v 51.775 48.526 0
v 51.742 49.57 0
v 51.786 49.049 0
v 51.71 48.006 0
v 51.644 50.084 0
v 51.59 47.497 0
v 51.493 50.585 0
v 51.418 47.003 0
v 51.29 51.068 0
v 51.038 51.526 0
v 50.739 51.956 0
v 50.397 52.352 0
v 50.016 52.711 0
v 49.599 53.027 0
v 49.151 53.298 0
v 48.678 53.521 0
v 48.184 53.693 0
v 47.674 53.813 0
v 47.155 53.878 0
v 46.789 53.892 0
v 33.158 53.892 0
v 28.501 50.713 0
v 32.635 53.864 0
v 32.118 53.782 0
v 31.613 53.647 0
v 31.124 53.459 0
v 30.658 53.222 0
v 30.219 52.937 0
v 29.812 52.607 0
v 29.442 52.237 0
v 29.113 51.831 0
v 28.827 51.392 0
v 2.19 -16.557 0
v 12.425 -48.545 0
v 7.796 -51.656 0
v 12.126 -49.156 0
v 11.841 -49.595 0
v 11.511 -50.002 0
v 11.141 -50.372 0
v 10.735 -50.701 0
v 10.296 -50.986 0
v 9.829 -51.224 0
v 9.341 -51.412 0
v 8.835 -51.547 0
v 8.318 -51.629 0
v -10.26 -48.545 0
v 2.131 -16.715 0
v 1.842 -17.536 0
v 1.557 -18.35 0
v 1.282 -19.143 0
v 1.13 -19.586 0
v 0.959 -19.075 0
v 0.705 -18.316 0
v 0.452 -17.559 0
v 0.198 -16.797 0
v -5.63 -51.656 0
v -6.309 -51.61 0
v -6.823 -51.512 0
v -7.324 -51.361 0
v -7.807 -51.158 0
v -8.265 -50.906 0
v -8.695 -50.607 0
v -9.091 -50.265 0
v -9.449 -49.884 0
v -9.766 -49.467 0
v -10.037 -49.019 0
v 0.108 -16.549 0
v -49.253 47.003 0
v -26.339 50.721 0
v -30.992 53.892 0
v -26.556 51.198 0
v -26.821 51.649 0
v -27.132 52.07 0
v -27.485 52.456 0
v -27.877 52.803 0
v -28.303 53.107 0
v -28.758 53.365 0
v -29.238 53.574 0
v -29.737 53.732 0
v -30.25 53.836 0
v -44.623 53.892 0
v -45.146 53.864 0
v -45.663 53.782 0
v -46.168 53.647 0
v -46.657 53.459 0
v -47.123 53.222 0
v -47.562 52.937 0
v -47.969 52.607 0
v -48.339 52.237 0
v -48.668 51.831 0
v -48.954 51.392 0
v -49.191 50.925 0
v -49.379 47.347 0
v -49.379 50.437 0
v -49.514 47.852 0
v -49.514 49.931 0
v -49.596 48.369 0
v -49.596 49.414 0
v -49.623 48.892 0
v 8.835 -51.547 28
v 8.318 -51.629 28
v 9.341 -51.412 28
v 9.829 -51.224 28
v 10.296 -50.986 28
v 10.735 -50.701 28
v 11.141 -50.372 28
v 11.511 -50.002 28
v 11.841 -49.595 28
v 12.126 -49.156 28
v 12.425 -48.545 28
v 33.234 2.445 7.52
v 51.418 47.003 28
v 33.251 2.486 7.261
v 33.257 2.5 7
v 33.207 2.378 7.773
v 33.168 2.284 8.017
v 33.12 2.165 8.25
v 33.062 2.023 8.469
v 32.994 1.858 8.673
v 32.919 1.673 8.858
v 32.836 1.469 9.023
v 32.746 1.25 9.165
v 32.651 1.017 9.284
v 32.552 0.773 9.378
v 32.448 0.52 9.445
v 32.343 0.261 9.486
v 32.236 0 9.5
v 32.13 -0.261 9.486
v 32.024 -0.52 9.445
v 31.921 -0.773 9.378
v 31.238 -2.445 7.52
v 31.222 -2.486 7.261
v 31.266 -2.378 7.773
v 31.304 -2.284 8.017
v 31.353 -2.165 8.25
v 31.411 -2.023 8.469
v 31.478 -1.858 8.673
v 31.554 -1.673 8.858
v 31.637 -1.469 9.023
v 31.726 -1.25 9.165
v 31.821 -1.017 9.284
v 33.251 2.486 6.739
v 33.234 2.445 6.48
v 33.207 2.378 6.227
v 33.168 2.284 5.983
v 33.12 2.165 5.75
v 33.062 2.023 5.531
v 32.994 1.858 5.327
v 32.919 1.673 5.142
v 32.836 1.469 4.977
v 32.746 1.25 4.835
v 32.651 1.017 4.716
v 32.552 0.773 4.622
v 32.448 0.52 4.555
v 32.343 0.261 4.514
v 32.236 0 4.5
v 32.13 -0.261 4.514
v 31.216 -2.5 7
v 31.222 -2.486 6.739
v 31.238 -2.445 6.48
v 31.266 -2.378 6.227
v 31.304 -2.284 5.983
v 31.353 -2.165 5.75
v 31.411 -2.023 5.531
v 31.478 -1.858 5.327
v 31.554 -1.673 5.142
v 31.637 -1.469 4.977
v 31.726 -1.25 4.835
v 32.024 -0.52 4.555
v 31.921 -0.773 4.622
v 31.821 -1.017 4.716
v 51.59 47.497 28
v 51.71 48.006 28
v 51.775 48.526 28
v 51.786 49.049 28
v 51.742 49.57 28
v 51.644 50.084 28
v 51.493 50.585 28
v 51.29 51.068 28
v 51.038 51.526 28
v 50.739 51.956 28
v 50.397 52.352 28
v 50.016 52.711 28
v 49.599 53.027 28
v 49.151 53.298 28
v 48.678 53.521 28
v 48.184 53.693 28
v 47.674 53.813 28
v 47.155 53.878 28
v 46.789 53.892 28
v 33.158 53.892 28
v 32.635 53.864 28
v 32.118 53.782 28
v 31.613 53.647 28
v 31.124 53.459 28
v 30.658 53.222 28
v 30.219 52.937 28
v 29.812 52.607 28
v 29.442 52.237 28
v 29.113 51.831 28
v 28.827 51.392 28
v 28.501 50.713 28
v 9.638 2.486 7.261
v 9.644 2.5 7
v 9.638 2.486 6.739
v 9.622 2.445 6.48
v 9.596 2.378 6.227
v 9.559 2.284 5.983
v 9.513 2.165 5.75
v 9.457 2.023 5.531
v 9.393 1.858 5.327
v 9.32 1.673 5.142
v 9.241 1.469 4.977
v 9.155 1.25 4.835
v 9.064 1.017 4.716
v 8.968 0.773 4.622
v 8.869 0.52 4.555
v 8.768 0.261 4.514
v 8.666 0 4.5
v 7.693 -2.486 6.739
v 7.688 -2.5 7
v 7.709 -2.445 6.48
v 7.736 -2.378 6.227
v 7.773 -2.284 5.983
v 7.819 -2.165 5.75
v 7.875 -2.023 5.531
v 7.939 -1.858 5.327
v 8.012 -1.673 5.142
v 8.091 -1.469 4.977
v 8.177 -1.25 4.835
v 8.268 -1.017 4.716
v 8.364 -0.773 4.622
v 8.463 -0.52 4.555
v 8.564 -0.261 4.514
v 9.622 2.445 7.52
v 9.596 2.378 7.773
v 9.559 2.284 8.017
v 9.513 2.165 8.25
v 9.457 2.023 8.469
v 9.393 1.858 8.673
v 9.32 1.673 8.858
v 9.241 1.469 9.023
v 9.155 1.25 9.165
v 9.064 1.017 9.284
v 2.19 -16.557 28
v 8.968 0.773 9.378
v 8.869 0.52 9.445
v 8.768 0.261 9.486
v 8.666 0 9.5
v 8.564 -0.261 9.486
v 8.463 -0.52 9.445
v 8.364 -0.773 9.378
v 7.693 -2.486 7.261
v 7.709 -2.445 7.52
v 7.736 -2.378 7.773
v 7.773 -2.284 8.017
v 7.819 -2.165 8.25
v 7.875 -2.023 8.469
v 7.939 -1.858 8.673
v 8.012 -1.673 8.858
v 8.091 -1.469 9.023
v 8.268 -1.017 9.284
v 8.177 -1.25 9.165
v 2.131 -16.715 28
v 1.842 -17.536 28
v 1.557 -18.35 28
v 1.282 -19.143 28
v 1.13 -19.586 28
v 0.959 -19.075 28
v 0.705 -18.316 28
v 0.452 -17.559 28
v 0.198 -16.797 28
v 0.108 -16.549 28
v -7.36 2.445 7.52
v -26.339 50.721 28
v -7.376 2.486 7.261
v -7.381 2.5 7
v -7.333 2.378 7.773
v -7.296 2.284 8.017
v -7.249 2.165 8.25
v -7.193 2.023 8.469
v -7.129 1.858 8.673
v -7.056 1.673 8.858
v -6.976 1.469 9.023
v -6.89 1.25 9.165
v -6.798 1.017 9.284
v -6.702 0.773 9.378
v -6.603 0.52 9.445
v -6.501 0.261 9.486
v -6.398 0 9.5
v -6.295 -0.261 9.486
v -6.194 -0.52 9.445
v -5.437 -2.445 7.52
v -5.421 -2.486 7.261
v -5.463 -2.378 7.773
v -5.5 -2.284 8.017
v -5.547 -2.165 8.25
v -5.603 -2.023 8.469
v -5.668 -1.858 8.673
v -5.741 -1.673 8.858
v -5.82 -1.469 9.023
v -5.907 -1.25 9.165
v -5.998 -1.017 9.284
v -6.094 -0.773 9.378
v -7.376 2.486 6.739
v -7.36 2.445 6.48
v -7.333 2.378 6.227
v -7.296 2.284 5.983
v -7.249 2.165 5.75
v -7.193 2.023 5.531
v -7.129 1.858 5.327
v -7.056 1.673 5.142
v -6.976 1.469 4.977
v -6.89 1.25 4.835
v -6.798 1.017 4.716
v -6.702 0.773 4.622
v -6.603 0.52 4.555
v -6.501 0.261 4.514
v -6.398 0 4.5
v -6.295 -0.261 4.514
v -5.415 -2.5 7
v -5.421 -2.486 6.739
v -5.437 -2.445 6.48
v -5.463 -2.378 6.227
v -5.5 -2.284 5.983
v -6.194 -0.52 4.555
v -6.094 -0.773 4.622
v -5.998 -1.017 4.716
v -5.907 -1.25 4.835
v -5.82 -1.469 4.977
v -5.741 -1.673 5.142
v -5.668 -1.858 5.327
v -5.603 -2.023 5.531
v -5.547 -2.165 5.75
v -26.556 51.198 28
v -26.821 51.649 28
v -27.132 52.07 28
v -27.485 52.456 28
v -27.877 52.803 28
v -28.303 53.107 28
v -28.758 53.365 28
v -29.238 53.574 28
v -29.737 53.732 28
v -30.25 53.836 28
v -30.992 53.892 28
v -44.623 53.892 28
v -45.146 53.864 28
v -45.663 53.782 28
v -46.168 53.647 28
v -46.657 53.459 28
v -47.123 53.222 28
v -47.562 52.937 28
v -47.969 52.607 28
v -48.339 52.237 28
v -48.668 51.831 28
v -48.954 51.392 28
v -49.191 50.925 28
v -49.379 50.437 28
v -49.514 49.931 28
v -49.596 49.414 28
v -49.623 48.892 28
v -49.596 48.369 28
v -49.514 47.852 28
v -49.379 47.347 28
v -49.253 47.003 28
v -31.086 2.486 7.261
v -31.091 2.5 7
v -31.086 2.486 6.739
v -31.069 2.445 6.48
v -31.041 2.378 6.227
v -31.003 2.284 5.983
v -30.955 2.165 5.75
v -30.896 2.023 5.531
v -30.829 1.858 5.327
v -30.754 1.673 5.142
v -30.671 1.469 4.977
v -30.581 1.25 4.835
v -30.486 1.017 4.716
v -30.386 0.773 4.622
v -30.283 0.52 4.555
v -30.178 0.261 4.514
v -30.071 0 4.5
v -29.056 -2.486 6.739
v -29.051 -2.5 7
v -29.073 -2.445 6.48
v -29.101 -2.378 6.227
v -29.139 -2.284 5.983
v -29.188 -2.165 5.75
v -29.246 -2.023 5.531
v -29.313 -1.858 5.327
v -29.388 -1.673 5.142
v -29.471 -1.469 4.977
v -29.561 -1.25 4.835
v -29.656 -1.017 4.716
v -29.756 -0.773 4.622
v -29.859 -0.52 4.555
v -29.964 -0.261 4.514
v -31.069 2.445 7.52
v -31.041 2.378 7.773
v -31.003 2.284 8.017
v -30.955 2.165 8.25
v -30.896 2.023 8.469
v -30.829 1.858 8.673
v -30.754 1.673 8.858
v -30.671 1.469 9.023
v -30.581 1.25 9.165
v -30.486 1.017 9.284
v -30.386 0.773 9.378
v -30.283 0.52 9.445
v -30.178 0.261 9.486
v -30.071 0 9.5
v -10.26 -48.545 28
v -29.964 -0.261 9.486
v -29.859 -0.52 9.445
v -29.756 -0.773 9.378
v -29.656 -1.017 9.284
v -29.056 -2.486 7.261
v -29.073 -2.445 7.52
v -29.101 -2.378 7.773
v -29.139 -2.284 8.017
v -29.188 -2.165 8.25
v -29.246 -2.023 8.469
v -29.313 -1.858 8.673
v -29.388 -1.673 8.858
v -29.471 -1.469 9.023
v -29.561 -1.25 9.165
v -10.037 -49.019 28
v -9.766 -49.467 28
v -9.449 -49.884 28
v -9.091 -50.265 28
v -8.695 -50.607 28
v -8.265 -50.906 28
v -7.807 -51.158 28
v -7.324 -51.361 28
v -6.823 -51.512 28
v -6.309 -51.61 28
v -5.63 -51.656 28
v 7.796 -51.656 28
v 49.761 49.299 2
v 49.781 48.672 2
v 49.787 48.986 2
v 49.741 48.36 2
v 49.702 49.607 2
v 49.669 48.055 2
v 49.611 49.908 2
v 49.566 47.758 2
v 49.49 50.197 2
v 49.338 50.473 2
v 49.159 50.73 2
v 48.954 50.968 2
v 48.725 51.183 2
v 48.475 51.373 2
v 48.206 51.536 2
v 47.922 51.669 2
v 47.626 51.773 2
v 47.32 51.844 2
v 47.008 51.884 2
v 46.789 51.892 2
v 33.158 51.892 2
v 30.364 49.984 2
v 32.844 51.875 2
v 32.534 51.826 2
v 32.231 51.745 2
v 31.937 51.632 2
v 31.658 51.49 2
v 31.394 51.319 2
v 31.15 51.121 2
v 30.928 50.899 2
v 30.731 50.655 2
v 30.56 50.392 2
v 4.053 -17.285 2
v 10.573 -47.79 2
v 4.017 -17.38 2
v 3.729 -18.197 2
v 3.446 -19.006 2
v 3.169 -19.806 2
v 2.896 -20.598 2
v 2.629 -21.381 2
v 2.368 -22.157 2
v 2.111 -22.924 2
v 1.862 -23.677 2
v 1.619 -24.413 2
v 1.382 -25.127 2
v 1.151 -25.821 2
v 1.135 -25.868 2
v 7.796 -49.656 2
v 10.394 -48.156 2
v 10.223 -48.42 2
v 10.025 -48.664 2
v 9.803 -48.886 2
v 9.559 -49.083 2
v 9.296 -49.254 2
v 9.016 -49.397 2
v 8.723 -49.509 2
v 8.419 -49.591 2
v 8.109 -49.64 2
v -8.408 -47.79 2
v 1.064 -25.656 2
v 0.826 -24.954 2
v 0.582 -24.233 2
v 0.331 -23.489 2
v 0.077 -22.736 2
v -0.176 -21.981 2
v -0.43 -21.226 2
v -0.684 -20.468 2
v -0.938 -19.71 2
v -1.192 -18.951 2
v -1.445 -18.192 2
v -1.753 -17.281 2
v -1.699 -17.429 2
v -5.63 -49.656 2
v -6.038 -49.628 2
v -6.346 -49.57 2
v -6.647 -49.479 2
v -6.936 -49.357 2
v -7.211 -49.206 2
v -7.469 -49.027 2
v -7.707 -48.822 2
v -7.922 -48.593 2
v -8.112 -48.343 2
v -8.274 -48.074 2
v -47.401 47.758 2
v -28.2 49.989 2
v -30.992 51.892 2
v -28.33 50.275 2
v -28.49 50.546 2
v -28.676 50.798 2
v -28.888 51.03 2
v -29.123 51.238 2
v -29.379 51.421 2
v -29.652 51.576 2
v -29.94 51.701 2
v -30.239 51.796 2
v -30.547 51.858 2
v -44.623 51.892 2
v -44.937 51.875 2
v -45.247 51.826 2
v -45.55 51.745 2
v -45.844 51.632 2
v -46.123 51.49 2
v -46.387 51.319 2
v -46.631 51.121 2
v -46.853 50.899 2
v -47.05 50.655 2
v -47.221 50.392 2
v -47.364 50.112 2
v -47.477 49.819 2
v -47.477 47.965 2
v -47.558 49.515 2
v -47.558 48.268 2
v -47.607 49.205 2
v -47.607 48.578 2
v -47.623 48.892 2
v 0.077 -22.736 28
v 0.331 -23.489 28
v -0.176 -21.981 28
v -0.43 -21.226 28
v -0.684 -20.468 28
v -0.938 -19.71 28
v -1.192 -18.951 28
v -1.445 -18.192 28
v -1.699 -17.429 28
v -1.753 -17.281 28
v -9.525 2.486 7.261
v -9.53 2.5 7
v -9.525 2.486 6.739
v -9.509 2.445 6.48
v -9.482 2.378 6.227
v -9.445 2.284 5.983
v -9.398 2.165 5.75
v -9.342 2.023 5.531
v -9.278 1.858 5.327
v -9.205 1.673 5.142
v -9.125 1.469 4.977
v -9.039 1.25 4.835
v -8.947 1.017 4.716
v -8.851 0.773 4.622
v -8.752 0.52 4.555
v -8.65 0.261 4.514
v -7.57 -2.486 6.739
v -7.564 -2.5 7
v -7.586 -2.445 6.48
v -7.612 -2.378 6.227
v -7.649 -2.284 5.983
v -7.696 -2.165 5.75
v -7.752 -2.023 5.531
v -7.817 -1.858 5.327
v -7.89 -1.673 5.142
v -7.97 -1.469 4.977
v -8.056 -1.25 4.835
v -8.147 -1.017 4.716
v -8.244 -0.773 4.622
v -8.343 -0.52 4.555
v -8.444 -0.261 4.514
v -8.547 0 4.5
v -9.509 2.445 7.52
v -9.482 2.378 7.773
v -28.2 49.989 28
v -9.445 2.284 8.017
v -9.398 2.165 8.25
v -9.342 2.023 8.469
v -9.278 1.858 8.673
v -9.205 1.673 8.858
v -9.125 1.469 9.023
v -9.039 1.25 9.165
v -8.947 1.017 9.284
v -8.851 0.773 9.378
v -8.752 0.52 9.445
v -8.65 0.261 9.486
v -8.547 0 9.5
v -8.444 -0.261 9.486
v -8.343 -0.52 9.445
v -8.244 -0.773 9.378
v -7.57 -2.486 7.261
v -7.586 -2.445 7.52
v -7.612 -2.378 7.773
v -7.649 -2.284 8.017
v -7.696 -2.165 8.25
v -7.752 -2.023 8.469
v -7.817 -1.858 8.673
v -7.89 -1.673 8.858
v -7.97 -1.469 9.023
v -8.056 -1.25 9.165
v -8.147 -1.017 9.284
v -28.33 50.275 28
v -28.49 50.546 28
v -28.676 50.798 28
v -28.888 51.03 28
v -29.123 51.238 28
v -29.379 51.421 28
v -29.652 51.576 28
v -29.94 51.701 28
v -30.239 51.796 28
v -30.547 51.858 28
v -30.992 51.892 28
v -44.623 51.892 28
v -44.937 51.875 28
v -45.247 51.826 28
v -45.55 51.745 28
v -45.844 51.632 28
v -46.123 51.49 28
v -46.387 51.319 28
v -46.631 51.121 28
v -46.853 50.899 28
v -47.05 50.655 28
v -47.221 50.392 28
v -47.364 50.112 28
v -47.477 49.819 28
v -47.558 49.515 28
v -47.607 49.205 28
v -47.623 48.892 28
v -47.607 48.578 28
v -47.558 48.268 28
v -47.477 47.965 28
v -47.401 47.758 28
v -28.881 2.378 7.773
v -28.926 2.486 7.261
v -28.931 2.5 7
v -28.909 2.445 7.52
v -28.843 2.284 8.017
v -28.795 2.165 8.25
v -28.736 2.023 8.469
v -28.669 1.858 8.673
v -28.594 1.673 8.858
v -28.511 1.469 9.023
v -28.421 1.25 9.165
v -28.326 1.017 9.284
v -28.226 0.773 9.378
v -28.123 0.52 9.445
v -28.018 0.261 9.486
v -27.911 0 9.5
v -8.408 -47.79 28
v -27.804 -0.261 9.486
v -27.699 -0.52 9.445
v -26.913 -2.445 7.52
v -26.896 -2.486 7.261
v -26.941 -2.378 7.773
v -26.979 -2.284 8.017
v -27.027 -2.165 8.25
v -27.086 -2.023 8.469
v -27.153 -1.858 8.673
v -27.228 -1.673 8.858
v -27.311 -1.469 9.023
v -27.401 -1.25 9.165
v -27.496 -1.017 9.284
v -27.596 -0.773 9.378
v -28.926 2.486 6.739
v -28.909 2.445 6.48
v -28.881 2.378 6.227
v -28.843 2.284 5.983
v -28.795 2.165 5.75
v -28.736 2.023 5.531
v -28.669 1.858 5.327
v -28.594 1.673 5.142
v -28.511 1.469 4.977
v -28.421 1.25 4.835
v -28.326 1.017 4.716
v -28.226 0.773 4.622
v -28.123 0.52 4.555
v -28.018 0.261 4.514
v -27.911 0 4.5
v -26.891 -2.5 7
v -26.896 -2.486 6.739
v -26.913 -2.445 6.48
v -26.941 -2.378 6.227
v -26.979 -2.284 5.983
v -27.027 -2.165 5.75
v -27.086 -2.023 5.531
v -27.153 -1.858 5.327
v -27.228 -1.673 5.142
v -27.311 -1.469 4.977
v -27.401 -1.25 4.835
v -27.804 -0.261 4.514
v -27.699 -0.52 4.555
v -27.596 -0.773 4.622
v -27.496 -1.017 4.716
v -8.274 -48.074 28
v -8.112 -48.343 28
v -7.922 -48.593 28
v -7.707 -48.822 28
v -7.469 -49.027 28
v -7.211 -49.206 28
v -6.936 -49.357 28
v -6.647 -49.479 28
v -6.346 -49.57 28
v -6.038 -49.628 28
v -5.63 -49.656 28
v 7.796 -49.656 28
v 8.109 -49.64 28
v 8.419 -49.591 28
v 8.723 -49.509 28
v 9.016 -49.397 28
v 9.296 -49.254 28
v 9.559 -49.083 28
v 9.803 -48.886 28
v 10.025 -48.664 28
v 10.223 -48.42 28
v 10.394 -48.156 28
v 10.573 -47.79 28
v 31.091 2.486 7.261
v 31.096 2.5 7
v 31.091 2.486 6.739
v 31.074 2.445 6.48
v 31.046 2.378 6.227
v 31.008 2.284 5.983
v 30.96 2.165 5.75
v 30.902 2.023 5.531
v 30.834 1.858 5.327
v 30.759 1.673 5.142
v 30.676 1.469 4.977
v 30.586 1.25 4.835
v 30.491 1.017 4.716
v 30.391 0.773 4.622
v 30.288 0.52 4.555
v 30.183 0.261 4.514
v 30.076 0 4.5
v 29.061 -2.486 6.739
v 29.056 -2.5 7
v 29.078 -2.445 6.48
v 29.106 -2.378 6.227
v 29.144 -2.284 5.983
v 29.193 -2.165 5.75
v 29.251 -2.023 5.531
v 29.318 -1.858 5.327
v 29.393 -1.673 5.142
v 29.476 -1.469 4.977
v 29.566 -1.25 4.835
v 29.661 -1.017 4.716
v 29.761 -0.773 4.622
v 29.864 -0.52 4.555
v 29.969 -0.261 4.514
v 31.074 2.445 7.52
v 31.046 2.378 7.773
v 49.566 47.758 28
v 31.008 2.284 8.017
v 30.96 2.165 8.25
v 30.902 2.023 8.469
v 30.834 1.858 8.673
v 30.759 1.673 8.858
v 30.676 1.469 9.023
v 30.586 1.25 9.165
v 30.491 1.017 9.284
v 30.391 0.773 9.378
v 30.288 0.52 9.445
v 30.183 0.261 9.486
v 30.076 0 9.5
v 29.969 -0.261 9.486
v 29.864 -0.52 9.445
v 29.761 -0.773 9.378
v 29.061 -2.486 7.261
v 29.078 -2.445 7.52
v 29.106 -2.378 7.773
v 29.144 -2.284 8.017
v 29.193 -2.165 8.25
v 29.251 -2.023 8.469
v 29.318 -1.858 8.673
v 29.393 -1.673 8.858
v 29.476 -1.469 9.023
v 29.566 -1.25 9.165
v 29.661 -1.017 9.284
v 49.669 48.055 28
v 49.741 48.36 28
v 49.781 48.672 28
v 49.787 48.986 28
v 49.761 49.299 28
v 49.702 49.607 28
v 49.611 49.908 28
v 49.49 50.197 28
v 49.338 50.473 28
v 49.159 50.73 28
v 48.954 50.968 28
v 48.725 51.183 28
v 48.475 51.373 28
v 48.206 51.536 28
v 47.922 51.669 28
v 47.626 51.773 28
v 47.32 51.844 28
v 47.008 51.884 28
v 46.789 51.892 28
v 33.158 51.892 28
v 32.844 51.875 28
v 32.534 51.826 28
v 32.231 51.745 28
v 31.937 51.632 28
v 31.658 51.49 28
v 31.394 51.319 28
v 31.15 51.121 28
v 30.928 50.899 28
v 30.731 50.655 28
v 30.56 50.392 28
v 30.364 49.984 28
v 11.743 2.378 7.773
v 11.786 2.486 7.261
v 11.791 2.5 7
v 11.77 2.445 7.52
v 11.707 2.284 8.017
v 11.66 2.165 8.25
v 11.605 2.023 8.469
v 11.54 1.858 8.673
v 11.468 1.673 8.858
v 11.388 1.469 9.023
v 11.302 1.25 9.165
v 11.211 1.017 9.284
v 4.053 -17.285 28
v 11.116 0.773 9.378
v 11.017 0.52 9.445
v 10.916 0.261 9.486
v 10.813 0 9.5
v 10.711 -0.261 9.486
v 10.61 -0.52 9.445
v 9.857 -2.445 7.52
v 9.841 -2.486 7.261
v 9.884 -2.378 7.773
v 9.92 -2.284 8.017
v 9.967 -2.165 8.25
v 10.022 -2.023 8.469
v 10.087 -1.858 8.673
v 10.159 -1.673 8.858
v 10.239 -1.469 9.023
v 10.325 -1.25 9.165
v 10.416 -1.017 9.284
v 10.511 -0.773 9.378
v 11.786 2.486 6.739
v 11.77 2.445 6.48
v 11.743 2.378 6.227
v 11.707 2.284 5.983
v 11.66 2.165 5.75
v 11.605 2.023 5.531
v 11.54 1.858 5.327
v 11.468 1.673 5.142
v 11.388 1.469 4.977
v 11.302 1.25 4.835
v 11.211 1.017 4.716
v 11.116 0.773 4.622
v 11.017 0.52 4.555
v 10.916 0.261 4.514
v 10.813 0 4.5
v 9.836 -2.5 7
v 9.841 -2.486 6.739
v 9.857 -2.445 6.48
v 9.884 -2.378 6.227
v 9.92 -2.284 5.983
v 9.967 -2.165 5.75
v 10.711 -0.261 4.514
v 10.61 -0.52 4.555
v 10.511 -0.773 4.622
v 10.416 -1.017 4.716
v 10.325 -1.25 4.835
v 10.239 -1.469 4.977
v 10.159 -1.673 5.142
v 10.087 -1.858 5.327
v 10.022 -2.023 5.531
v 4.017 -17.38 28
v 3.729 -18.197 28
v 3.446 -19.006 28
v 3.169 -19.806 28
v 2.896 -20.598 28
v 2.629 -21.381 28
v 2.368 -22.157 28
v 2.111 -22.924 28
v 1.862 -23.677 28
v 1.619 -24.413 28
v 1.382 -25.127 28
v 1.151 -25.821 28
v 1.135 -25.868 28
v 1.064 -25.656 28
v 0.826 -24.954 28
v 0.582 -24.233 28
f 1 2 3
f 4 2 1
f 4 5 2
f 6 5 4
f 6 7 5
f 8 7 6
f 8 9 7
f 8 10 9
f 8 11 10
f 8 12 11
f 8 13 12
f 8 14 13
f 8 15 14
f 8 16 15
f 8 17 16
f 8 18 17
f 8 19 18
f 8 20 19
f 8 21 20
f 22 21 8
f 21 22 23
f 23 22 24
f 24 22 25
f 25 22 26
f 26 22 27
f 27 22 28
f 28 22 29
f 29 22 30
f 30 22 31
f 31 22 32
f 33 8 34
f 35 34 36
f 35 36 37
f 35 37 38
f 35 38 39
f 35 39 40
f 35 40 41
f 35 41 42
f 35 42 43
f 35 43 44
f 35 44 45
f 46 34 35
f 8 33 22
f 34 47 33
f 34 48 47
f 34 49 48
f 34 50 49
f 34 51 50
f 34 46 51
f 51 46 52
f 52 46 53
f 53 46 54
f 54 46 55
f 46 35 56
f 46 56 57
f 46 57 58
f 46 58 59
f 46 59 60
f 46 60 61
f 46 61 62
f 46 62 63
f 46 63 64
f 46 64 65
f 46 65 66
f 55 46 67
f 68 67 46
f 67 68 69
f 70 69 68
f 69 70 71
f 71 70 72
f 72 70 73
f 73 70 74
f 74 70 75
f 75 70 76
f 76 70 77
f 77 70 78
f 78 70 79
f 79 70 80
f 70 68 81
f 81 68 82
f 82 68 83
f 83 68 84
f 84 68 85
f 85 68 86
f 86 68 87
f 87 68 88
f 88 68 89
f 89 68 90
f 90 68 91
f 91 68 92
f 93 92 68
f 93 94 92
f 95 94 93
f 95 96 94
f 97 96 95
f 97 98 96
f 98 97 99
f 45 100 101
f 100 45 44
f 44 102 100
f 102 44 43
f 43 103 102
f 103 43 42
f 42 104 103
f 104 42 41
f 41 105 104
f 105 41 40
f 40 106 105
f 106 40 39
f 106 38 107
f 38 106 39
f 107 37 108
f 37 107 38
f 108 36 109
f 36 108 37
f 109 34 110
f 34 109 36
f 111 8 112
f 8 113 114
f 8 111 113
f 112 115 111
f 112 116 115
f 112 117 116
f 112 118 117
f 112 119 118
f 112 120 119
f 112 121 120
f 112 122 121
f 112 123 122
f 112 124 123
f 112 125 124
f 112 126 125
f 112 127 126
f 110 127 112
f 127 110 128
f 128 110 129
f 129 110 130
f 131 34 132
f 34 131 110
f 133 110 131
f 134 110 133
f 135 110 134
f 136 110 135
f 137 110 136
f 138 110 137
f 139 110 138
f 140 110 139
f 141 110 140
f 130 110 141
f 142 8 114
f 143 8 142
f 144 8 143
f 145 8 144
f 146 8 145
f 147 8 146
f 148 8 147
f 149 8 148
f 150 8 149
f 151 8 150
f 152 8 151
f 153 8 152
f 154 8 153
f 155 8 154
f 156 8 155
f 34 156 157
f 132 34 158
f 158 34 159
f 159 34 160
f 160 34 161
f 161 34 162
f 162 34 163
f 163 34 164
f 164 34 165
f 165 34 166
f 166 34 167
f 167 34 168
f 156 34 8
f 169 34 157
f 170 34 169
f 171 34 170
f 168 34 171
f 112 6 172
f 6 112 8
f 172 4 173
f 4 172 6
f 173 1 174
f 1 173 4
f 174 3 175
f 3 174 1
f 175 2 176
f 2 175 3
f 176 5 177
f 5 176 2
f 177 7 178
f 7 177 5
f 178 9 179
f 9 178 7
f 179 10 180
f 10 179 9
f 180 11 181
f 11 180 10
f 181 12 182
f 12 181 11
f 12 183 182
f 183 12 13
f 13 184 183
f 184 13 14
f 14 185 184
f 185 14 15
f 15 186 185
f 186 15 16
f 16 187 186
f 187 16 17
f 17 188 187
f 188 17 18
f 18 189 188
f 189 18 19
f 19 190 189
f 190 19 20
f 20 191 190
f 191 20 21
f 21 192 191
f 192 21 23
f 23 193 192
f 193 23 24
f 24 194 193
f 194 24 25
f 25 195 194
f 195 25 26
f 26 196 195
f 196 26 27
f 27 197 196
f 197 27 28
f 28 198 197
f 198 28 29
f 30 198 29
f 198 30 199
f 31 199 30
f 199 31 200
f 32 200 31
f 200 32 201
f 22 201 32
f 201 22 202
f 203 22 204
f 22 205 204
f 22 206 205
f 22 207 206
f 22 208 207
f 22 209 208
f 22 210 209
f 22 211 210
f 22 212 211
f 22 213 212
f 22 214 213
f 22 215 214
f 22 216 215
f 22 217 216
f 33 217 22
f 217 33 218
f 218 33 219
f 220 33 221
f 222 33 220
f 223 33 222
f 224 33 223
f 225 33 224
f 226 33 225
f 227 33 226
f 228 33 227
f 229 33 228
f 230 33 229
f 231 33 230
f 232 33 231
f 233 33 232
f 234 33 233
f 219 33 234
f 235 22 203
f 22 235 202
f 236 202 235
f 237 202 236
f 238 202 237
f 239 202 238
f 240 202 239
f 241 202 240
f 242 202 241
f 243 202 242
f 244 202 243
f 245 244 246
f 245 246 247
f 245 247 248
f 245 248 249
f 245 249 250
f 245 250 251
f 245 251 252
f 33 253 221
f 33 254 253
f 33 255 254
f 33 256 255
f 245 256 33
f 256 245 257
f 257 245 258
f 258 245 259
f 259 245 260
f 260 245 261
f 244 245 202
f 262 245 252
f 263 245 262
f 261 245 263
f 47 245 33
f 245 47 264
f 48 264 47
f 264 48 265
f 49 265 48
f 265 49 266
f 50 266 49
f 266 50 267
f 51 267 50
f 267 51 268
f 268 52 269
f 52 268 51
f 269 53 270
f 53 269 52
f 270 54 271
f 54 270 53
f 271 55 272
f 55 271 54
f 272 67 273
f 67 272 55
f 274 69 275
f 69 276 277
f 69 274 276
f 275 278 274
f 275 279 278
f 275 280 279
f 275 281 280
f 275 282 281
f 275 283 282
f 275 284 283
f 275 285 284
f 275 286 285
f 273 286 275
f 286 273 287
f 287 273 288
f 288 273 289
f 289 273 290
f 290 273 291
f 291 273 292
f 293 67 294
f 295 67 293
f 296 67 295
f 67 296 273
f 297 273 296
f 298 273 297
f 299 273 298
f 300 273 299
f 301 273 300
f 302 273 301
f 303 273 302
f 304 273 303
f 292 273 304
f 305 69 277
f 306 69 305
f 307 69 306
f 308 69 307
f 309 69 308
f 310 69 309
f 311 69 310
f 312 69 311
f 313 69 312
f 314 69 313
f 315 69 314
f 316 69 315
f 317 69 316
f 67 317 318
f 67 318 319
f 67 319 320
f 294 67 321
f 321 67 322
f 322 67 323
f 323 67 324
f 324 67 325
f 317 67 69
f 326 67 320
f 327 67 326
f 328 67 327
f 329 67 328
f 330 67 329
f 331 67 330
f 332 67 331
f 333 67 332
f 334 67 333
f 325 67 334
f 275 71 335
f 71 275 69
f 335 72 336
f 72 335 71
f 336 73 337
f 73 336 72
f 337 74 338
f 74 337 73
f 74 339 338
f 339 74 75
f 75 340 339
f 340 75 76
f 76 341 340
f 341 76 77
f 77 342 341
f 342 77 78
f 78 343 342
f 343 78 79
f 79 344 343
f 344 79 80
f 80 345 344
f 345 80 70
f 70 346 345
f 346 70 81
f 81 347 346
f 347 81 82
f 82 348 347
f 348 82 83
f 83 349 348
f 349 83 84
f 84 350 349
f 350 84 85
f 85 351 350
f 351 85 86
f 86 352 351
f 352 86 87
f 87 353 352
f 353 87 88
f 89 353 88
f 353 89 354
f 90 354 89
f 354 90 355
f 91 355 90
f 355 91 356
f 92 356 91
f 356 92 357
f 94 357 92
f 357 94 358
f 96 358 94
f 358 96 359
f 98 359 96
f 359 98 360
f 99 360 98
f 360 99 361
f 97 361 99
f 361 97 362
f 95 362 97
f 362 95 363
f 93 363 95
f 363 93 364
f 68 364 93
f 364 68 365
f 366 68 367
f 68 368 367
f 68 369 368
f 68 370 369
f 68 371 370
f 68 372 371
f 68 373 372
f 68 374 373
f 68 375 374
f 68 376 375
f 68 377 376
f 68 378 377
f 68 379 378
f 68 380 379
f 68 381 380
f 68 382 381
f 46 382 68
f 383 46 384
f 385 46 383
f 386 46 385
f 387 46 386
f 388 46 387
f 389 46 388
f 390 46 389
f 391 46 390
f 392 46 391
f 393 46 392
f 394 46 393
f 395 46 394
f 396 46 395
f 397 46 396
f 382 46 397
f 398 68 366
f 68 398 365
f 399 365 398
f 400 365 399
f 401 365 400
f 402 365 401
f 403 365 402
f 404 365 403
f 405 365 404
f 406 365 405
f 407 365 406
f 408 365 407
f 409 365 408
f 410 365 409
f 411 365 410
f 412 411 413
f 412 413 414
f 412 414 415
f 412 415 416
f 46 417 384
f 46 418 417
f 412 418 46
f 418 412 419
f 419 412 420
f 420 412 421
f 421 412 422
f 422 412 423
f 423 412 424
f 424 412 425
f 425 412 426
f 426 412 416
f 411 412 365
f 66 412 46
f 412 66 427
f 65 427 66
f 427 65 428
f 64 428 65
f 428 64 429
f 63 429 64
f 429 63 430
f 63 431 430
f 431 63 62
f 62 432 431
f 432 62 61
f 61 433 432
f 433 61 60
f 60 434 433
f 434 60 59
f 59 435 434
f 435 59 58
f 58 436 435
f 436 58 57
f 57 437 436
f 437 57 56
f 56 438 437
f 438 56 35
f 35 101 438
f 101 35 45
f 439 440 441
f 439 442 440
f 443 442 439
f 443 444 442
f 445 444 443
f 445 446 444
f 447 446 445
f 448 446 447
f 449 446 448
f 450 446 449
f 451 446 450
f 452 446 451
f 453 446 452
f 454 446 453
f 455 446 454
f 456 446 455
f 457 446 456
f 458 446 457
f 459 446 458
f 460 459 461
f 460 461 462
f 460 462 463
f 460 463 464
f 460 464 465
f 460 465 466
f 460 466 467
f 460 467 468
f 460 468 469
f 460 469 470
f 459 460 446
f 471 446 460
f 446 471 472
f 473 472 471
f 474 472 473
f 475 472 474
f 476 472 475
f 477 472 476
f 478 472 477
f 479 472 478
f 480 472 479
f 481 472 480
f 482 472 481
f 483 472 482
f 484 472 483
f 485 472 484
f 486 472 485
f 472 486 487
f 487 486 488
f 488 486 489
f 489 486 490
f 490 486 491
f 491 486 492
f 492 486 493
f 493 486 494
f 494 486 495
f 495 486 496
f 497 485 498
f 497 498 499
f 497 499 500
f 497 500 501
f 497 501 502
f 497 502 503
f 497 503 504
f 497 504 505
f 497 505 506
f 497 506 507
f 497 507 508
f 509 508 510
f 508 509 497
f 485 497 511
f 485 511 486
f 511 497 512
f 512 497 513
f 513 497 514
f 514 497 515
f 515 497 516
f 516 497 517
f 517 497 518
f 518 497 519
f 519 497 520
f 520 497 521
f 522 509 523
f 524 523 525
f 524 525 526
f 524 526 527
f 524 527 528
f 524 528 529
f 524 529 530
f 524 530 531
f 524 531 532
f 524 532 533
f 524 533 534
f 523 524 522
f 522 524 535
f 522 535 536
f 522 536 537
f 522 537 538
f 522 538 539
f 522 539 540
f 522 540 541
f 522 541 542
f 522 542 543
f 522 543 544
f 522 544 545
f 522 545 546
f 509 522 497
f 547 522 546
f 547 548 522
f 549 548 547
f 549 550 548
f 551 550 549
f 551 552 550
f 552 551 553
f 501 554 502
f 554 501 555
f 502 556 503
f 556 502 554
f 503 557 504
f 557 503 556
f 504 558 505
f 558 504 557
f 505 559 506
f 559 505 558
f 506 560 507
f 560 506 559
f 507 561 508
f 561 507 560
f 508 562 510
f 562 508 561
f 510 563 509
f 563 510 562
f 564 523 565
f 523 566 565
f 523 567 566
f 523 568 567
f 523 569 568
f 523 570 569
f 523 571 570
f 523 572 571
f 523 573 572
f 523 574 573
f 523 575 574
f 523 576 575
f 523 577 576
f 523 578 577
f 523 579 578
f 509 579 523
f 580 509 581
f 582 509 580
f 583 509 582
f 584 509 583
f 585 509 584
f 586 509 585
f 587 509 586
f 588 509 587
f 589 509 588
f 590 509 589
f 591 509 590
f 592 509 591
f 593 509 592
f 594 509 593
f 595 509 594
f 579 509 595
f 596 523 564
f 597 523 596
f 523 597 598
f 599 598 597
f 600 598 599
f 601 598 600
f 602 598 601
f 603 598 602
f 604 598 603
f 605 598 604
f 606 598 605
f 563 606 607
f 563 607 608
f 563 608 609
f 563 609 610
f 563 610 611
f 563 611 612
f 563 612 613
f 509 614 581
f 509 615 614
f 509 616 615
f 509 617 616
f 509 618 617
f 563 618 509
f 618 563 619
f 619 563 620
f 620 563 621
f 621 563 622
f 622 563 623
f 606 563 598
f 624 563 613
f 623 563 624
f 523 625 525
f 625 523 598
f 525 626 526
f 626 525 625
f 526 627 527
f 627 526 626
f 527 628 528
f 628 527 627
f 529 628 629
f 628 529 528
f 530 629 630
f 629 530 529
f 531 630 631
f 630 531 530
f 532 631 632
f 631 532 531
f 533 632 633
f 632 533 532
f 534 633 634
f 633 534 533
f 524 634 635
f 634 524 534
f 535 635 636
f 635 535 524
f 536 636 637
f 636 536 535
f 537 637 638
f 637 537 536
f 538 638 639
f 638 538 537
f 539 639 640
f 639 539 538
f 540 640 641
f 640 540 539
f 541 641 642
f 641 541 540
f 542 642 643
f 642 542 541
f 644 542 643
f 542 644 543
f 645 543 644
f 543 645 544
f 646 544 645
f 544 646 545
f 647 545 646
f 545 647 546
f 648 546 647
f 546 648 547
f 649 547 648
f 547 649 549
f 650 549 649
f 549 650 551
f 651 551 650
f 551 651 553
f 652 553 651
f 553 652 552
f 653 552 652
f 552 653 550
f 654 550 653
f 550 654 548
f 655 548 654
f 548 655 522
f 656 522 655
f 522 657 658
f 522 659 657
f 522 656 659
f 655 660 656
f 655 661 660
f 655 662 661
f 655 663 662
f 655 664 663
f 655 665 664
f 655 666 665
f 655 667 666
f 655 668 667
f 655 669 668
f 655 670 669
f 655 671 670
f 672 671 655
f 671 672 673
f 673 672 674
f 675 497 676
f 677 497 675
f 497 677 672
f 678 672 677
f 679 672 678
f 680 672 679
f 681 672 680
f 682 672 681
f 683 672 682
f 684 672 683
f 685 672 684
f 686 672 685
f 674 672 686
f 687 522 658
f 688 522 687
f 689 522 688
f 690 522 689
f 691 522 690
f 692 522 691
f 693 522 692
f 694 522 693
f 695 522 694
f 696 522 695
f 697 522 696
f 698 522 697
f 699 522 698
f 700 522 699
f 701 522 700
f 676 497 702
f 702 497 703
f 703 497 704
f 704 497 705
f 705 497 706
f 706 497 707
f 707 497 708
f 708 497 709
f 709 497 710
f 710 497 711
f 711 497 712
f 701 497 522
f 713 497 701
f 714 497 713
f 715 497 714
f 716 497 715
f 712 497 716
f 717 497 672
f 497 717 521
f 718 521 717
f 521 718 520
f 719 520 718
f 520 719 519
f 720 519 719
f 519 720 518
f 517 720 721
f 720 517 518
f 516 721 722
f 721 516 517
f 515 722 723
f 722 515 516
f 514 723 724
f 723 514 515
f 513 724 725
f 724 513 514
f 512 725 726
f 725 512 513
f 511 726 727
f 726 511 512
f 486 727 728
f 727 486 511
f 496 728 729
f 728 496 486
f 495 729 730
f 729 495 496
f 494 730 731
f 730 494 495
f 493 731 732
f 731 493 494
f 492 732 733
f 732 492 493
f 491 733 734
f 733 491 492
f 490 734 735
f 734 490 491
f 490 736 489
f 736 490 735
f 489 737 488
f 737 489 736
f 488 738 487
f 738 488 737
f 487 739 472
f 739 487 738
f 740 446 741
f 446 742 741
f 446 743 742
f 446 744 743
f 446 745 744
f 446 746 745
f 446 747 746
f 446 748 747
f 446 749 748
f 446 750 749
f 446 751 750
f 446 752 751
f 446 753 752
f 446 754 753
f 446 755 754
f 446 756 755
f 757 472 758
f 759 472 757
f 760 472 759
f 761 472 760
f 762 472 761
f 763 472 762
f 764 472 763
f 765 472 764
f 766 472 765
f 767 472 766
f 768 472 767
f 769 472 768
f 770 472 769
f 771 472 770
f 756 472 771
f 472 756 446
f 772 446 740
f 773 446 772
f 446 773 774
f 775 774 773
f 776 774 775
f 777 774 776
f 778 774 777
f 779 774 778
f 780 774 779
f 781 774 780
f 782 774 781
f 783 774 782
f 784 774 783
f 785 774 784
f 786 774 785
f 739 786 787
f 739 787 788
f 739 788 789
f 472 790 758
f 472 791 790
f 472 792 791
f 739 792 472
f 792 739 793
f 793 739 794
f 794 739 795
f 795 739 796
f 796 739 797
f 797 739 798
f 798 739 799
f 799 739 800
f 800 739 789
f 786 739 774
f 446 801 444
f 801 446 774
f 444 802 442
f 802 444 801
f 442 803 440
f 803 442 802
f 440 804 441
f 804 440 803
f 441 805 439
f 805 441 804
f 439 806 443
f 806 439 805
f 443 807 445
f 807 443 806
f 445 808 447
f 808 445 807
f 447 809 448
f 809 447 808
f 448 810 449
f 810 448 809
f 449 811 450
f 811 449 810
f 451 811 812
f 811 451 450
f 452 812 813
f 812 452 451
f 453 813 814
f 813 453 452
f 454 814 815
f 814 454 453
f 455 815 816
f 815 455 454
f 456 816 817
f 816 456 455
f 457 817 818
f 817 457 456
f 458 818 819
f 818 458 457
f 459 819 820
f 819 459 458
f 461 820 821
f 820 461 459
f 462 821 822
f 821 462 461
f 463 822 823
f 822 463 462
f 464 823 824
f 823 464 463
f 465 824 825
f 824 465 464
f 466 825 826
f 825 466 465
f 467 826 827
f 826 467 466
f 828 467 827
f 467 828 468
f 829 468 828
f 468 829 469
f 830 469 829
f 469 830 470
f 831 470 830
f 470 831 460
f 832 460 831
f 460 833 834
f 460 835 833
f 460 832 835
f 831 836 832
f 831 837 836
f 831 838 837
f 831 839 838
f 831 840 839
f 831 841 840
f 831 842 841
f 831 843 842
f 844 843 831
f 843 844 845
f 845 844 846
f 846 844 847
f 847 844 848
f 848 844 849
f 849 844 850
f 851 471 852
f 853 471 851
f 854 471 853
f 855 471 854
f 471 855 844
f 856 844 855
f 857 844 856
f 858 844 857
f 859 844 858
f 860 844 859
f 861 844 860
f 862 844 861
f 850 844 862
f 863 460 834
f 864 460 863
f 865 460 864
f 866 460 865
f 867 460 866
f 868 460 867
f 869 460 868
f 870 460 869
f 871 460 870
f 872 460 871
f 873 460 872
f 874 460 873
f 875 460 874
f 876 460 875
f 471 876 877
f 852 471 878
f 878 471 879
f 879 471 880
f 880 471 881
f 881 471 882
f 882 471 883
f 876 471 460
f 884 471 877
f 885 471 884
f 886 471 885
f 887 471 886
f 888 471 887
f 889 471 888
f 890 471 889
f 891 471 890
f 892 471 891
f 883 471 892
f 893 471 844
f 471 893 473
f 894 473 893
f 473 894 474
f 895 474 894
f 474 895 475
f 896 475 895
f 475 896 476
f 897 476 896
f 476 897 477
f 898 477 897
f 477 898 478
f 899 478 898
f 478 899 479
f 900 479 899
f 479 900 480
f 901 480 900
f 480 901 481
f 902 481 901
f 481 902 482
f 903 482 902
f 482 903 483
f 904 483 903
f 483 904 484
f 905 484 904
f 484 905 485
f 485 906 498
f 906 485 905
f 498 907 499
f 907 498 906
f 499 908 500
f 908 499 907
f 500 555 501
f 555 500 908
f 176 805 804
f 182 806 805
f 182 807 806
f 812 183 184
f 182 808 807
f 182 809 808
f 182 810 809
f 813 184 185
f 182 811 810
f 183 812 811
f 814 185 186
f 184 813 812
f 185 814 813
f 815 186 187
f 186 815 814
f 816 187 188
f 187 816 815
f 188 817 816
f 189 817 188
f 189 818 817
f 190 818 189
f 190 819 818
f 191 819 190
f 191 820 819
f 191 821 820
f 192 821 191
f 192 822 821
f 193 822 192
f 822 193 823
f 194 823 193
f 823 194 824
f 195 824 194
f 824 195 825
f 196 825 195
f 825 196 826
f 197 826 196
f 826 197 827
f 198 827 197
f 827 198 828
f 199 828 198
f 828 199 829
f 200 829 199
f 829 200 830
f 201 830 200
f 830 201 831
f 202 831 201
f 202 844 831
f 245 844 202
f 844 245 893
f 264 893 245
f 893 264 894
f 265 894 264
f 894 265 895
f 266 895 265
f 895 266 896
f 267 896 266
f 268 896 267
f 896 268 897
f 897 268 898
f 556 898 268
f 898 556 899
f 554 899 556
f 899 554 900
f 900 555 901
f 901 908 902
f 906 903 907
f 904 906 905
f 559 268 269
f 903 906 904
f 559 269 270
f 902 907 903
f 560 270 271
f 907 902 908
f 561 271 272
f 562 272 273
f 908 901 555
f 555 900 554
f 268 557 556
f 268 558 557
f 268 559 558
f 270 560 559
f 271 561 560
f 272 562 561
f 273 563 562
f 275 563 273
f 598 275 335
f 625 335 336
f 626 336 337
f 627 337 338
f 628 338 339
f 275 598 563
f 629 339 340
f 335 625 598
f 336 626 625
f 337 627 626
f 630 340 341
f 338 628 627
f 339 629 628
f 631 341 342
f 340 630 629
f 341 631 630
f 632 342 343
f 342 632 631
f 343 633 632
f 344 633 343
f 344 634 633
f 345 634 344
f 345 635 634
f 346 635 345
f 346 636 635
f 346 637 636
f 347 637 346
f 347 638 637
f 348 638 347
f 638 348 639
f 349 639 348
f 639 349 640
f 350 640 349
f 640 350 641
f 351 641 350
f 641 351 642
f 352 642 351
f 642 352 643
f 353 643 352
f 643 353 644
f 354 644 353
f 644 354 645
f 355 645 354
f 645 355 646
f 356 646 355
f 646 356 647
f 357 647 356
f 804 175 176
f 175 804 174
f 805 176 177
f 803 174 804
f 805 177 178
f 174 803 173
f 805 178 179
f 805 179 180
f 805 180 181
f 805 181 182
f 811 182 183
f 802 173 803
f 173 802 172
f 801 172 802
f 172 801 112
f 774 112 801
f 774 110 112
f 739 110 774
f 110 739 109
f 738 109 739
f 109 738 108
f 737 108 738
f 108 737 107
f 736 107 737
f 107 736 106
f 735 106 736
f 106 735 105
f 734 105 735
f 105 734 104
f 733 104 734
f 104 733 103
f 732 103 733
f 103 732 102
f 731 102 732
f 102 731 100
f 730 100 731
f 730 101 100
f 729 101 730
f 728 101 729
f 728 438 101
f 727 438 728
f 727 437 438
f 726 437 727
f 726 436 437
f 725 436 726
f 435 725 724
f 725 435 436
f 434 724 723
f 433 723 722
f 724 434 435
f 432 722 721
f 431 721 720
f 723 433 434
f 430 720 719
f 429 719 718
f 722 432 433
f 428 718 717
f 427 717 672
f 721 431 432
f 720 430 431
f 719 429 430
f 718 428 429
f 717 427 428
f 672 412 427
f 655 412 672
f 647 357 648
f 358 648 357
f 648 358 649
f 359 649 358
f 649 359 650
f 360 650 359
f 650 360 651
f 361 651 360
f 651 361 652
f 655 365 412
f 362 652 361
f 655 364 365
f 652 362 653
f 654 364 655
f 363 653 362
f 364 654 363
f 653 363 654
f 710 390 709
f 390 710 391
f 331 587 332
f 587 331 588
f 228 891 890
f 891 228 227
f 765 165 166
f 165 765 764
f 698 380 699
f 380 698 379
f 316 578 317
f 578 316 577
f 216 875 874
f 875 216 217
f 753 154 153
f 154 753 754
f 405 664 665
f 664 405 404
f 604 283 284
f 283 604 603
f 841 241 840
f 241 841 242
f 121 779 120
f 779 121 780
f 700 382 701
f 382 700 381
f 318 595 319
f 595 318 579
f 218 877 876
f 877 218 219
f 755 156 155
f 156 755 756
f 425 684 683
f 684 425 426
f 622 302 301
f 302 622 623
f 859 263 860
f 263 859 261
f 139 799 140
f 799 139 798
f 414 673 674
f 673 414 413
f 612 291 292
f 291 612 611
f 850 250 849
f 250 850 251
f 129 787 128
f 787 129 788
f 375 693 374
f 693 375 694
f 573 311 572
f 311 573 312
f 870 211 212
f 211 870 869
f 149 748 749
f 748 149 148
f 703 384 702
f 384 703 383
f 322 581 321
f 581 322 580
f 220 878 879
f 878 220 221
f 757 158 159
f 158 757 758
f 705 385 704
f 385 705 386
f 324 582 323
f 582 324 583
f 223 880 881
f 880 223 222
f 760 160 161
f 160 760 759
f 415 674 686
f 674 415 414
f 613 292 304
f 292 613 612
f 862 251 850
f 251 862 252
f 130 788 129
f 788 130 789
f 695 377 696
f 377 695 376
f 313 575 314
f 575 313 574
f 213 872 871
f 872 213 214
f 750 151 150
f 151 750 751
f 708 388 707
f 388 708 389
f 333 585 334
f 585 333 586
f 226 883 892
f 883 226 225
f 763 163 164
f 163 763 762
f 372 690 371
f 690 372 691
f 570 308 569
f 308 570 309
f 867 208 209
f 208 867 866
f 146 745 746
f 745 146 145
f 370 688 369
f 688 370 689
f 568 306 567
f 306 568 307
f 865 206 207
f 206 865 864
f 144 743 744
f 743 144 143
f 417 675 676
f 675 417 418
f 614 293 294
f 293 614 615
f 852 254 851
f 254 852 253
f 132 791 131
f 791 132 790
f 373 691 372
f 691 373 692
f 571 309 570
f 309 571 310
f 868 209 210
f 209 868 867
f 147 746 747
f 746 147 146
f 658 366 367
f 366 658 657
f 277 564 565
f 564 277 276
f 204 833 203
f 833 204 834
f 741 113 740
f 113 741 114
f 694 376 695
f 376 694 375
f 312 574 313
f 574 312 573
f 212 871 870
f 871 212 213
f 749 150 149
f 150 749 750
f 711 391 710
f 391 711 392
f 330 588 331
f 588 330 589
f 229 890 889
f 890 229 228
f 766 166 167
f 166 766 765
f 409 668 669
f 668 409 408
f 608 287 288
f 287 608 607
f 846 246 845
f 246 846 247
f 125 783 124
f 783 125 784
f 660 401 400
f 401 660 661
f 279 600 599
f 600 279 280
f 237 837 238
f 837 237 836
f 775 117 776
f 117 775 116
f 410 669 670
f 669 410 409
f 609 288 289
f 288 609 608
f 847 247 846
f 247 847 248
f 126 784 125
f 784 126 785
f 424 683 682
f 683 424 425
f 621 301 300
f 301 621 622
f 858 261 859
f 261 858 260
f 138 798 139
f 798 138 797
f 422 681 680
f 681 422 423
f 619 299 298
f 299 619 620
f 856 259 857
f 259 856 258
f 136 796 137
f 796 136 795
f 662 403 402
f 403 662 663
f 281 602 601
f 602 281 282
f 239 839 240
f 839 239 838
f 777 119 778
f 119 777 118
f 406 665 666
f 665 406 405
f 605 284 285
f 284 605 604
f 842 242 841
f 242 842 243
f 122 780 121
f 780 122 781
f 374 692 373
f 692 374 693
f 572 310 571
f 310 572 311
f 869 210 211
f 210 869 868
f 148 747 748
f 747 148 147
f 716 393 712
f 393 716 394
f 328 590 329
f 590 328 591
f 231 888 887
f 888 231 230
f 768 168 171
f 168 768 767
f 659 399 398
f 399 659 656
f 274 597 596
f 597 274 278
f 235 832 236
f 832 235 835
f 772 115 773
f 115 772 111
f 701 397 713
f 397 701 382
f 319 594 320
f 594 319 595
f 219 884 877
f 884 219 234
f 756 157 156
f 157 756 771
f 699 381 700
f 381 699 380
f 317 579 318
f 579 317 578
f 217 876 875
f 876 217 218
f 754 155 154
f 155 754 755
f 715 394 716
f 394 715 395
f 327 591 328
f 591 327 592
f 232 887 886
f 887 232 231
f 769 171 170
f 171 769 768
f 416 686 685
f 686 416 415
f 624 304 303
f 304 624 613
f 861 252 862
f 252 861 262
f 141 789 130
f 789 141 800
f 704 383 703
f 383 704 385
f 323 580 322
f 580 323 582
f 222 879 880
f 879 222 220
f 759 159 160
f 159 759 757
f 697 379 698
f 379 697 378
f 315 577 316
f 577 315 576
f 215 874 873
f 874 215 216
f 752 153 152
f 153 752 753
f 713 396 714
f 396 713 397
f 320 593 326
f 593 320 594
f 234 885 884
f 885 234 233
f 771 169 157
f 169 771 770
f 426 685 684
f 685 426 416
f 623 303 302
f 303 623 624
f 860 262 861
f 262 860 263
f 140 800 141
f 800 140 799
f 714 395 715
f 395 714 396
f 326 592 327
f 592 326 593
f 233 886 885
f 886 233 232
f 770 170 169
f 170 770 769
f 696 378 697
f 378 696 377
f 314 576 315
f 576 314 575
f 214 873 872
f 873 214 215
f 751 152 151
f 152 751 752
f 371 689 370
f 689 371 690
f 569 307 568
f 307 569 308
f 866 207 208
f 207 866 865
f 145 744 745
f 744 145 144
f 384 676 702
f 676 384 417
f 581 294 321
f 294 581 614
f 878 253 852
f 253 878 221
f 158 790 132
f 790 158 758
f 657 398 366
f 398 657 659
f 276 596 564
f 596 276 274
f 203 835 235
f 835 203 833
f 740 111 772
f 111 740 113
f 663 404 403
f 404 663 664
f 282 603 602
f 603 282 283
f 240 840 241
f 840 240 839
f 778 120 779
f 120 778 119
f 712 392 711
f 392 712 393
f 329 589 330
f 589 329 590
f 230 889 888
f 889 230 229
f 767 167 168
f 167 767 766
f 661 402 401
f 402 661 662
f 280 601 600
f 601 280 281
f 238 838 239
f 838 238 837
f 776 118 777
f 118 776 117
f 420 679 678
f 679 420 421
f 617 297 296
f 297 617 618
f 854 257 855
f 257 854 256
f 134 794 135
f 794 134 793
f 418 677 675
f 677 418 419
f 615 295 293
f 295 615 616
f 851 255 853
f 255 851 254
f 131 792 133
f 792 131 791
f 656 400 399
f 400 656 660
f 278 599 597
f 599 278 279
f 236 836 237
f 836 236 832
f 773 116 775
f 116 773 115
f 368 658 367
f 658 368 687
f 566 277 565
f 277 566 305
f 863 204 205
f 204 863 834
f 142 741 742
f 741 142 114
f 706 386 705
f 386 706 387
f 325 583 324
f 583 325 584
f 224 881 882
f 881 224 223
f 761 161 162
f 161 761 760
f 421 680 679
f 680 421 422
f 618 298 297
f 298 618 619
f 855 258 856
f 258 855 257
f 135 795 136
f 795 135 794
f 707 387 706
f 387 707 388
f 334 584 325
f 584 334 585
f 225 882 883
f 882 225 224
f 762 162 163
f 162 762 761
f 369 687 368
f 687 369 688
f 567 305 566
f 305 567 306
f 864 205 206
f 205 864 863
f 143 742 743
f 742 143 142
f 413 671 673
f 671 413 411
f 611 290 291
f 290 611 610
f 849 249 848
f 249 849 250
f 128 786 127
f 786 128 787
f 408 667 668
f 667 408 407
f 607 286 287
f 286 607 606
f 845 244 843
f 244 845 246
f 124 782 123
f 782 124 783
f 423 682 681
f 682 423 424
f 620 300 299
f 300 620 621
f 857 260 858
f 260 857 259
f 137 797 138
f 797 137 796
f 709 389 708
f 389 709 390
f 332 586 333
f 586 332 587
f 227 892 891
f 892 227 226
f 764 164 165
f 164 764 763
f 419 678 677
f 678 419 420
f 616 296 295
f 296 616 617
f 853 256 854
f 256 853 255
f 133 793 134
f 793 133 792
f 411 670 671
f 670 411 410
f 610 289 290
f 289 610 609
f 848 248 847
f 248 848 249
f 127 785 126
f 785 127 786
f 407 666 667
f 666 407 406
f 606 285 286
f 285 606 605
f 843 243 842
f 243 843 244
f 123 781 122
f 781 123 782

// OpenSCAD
// AUTOMATICALLY GENERATED FILE: Letter_V
// SIGN SCULPTOR ENGINE V2

Render_Mode = "Body"; // Set to "Lid" to export the cover
Letter = "V";
Font_Size = 100;
Font_Name = "Arial:style=Black";
Light_Type = "Silicone_Neon_6mm";

// -- Engineering Constants --
Sign_Height = 30.0;
Wall_Thickness = 2.0;
Base_Thickness = 2.0;
Lid_Tolerance = 0.15;
Hole_Height = 5.0;
Hole_Size = 5.0;

// -- Logic Engine --
CW = (Light_Type == "Silicone_Neon_6mm") ? 6.0 :
     (Light_Type == "Silicone_Neon_8mm") ? 8.0 :
     (Light_Type == "LED_Strip_10mm")    ? 10.5 :
     (Light_Type == "Individual_Pixels")  ? 14.0 : 6.0;

Lip_Overhang = (Light_Type == "Silicone_Neon_6mm" || Light_Type == "Silicone_Neon_8mm") ? 0.4 : 0.0;

$fn = 60;

module letter_shape() {
    text(text=Letter, size=Font_Size, font=Font_Name, halign="center", valign="center");
}

module body_geometry() {
    difference() {
        // 1. Positive Block
        linear_extrude(Sign_Height)
            offset(r = CW/2 + Wall_Thickness)
            letter_shape();

        // 2. Light Channel
        translate([0,0, Base_Thickness])
            linear_extrude(Sign_Height + 1)
            offset(r = CW/2)
            letter_shape();

        // 3. Friction Lip
        if (Lip_Overhang > 0) {
            translate([0,0, Sign_Height - 2.0])
                linear_extrude(3.0)
                difference() {
                    offset(r = CW/2 + 5) letter_shape();
                    offset(r = CW/2 - Lip_Overhang) letter_shape();
                }
        }
        
        // 4. Lid Shelf
        translate([0,0, Sign_Height - 2.0])
            linear_extrude(3.0)
            offset(r = CW/2 + 1.5)
            letter_shape();

        // 5. WIRE CHANNELS (Dynamic Side Holes)
        // Left Hole
        translate([-Font_Size/1.8, 0, Hole_Height + Base_Thickness])
            rotate([0, 90, 0])
            cylinder(h = Font_Size, r = Hole_Size/2);
            
        // Right Hole
        translate([Font_Size/1.8, 0, Hole_Height + Base_Thickness])
            rotate([0, -90, 0])
            cylinder(h = Font_Size, r = Hole_Size/2);
    }
}

module lid_geometry() {
    color("White")
        linear_extrude(2.0)
        offset(r = (CW/2 + 1.5) - Lid_Tolerance)
        letter_shape();
}

// Render Controller
if (Render_Mode == "Body") {
    body_geometry();
} else if (Render_Mode == "Lid") {
    lid_geometry();
}
